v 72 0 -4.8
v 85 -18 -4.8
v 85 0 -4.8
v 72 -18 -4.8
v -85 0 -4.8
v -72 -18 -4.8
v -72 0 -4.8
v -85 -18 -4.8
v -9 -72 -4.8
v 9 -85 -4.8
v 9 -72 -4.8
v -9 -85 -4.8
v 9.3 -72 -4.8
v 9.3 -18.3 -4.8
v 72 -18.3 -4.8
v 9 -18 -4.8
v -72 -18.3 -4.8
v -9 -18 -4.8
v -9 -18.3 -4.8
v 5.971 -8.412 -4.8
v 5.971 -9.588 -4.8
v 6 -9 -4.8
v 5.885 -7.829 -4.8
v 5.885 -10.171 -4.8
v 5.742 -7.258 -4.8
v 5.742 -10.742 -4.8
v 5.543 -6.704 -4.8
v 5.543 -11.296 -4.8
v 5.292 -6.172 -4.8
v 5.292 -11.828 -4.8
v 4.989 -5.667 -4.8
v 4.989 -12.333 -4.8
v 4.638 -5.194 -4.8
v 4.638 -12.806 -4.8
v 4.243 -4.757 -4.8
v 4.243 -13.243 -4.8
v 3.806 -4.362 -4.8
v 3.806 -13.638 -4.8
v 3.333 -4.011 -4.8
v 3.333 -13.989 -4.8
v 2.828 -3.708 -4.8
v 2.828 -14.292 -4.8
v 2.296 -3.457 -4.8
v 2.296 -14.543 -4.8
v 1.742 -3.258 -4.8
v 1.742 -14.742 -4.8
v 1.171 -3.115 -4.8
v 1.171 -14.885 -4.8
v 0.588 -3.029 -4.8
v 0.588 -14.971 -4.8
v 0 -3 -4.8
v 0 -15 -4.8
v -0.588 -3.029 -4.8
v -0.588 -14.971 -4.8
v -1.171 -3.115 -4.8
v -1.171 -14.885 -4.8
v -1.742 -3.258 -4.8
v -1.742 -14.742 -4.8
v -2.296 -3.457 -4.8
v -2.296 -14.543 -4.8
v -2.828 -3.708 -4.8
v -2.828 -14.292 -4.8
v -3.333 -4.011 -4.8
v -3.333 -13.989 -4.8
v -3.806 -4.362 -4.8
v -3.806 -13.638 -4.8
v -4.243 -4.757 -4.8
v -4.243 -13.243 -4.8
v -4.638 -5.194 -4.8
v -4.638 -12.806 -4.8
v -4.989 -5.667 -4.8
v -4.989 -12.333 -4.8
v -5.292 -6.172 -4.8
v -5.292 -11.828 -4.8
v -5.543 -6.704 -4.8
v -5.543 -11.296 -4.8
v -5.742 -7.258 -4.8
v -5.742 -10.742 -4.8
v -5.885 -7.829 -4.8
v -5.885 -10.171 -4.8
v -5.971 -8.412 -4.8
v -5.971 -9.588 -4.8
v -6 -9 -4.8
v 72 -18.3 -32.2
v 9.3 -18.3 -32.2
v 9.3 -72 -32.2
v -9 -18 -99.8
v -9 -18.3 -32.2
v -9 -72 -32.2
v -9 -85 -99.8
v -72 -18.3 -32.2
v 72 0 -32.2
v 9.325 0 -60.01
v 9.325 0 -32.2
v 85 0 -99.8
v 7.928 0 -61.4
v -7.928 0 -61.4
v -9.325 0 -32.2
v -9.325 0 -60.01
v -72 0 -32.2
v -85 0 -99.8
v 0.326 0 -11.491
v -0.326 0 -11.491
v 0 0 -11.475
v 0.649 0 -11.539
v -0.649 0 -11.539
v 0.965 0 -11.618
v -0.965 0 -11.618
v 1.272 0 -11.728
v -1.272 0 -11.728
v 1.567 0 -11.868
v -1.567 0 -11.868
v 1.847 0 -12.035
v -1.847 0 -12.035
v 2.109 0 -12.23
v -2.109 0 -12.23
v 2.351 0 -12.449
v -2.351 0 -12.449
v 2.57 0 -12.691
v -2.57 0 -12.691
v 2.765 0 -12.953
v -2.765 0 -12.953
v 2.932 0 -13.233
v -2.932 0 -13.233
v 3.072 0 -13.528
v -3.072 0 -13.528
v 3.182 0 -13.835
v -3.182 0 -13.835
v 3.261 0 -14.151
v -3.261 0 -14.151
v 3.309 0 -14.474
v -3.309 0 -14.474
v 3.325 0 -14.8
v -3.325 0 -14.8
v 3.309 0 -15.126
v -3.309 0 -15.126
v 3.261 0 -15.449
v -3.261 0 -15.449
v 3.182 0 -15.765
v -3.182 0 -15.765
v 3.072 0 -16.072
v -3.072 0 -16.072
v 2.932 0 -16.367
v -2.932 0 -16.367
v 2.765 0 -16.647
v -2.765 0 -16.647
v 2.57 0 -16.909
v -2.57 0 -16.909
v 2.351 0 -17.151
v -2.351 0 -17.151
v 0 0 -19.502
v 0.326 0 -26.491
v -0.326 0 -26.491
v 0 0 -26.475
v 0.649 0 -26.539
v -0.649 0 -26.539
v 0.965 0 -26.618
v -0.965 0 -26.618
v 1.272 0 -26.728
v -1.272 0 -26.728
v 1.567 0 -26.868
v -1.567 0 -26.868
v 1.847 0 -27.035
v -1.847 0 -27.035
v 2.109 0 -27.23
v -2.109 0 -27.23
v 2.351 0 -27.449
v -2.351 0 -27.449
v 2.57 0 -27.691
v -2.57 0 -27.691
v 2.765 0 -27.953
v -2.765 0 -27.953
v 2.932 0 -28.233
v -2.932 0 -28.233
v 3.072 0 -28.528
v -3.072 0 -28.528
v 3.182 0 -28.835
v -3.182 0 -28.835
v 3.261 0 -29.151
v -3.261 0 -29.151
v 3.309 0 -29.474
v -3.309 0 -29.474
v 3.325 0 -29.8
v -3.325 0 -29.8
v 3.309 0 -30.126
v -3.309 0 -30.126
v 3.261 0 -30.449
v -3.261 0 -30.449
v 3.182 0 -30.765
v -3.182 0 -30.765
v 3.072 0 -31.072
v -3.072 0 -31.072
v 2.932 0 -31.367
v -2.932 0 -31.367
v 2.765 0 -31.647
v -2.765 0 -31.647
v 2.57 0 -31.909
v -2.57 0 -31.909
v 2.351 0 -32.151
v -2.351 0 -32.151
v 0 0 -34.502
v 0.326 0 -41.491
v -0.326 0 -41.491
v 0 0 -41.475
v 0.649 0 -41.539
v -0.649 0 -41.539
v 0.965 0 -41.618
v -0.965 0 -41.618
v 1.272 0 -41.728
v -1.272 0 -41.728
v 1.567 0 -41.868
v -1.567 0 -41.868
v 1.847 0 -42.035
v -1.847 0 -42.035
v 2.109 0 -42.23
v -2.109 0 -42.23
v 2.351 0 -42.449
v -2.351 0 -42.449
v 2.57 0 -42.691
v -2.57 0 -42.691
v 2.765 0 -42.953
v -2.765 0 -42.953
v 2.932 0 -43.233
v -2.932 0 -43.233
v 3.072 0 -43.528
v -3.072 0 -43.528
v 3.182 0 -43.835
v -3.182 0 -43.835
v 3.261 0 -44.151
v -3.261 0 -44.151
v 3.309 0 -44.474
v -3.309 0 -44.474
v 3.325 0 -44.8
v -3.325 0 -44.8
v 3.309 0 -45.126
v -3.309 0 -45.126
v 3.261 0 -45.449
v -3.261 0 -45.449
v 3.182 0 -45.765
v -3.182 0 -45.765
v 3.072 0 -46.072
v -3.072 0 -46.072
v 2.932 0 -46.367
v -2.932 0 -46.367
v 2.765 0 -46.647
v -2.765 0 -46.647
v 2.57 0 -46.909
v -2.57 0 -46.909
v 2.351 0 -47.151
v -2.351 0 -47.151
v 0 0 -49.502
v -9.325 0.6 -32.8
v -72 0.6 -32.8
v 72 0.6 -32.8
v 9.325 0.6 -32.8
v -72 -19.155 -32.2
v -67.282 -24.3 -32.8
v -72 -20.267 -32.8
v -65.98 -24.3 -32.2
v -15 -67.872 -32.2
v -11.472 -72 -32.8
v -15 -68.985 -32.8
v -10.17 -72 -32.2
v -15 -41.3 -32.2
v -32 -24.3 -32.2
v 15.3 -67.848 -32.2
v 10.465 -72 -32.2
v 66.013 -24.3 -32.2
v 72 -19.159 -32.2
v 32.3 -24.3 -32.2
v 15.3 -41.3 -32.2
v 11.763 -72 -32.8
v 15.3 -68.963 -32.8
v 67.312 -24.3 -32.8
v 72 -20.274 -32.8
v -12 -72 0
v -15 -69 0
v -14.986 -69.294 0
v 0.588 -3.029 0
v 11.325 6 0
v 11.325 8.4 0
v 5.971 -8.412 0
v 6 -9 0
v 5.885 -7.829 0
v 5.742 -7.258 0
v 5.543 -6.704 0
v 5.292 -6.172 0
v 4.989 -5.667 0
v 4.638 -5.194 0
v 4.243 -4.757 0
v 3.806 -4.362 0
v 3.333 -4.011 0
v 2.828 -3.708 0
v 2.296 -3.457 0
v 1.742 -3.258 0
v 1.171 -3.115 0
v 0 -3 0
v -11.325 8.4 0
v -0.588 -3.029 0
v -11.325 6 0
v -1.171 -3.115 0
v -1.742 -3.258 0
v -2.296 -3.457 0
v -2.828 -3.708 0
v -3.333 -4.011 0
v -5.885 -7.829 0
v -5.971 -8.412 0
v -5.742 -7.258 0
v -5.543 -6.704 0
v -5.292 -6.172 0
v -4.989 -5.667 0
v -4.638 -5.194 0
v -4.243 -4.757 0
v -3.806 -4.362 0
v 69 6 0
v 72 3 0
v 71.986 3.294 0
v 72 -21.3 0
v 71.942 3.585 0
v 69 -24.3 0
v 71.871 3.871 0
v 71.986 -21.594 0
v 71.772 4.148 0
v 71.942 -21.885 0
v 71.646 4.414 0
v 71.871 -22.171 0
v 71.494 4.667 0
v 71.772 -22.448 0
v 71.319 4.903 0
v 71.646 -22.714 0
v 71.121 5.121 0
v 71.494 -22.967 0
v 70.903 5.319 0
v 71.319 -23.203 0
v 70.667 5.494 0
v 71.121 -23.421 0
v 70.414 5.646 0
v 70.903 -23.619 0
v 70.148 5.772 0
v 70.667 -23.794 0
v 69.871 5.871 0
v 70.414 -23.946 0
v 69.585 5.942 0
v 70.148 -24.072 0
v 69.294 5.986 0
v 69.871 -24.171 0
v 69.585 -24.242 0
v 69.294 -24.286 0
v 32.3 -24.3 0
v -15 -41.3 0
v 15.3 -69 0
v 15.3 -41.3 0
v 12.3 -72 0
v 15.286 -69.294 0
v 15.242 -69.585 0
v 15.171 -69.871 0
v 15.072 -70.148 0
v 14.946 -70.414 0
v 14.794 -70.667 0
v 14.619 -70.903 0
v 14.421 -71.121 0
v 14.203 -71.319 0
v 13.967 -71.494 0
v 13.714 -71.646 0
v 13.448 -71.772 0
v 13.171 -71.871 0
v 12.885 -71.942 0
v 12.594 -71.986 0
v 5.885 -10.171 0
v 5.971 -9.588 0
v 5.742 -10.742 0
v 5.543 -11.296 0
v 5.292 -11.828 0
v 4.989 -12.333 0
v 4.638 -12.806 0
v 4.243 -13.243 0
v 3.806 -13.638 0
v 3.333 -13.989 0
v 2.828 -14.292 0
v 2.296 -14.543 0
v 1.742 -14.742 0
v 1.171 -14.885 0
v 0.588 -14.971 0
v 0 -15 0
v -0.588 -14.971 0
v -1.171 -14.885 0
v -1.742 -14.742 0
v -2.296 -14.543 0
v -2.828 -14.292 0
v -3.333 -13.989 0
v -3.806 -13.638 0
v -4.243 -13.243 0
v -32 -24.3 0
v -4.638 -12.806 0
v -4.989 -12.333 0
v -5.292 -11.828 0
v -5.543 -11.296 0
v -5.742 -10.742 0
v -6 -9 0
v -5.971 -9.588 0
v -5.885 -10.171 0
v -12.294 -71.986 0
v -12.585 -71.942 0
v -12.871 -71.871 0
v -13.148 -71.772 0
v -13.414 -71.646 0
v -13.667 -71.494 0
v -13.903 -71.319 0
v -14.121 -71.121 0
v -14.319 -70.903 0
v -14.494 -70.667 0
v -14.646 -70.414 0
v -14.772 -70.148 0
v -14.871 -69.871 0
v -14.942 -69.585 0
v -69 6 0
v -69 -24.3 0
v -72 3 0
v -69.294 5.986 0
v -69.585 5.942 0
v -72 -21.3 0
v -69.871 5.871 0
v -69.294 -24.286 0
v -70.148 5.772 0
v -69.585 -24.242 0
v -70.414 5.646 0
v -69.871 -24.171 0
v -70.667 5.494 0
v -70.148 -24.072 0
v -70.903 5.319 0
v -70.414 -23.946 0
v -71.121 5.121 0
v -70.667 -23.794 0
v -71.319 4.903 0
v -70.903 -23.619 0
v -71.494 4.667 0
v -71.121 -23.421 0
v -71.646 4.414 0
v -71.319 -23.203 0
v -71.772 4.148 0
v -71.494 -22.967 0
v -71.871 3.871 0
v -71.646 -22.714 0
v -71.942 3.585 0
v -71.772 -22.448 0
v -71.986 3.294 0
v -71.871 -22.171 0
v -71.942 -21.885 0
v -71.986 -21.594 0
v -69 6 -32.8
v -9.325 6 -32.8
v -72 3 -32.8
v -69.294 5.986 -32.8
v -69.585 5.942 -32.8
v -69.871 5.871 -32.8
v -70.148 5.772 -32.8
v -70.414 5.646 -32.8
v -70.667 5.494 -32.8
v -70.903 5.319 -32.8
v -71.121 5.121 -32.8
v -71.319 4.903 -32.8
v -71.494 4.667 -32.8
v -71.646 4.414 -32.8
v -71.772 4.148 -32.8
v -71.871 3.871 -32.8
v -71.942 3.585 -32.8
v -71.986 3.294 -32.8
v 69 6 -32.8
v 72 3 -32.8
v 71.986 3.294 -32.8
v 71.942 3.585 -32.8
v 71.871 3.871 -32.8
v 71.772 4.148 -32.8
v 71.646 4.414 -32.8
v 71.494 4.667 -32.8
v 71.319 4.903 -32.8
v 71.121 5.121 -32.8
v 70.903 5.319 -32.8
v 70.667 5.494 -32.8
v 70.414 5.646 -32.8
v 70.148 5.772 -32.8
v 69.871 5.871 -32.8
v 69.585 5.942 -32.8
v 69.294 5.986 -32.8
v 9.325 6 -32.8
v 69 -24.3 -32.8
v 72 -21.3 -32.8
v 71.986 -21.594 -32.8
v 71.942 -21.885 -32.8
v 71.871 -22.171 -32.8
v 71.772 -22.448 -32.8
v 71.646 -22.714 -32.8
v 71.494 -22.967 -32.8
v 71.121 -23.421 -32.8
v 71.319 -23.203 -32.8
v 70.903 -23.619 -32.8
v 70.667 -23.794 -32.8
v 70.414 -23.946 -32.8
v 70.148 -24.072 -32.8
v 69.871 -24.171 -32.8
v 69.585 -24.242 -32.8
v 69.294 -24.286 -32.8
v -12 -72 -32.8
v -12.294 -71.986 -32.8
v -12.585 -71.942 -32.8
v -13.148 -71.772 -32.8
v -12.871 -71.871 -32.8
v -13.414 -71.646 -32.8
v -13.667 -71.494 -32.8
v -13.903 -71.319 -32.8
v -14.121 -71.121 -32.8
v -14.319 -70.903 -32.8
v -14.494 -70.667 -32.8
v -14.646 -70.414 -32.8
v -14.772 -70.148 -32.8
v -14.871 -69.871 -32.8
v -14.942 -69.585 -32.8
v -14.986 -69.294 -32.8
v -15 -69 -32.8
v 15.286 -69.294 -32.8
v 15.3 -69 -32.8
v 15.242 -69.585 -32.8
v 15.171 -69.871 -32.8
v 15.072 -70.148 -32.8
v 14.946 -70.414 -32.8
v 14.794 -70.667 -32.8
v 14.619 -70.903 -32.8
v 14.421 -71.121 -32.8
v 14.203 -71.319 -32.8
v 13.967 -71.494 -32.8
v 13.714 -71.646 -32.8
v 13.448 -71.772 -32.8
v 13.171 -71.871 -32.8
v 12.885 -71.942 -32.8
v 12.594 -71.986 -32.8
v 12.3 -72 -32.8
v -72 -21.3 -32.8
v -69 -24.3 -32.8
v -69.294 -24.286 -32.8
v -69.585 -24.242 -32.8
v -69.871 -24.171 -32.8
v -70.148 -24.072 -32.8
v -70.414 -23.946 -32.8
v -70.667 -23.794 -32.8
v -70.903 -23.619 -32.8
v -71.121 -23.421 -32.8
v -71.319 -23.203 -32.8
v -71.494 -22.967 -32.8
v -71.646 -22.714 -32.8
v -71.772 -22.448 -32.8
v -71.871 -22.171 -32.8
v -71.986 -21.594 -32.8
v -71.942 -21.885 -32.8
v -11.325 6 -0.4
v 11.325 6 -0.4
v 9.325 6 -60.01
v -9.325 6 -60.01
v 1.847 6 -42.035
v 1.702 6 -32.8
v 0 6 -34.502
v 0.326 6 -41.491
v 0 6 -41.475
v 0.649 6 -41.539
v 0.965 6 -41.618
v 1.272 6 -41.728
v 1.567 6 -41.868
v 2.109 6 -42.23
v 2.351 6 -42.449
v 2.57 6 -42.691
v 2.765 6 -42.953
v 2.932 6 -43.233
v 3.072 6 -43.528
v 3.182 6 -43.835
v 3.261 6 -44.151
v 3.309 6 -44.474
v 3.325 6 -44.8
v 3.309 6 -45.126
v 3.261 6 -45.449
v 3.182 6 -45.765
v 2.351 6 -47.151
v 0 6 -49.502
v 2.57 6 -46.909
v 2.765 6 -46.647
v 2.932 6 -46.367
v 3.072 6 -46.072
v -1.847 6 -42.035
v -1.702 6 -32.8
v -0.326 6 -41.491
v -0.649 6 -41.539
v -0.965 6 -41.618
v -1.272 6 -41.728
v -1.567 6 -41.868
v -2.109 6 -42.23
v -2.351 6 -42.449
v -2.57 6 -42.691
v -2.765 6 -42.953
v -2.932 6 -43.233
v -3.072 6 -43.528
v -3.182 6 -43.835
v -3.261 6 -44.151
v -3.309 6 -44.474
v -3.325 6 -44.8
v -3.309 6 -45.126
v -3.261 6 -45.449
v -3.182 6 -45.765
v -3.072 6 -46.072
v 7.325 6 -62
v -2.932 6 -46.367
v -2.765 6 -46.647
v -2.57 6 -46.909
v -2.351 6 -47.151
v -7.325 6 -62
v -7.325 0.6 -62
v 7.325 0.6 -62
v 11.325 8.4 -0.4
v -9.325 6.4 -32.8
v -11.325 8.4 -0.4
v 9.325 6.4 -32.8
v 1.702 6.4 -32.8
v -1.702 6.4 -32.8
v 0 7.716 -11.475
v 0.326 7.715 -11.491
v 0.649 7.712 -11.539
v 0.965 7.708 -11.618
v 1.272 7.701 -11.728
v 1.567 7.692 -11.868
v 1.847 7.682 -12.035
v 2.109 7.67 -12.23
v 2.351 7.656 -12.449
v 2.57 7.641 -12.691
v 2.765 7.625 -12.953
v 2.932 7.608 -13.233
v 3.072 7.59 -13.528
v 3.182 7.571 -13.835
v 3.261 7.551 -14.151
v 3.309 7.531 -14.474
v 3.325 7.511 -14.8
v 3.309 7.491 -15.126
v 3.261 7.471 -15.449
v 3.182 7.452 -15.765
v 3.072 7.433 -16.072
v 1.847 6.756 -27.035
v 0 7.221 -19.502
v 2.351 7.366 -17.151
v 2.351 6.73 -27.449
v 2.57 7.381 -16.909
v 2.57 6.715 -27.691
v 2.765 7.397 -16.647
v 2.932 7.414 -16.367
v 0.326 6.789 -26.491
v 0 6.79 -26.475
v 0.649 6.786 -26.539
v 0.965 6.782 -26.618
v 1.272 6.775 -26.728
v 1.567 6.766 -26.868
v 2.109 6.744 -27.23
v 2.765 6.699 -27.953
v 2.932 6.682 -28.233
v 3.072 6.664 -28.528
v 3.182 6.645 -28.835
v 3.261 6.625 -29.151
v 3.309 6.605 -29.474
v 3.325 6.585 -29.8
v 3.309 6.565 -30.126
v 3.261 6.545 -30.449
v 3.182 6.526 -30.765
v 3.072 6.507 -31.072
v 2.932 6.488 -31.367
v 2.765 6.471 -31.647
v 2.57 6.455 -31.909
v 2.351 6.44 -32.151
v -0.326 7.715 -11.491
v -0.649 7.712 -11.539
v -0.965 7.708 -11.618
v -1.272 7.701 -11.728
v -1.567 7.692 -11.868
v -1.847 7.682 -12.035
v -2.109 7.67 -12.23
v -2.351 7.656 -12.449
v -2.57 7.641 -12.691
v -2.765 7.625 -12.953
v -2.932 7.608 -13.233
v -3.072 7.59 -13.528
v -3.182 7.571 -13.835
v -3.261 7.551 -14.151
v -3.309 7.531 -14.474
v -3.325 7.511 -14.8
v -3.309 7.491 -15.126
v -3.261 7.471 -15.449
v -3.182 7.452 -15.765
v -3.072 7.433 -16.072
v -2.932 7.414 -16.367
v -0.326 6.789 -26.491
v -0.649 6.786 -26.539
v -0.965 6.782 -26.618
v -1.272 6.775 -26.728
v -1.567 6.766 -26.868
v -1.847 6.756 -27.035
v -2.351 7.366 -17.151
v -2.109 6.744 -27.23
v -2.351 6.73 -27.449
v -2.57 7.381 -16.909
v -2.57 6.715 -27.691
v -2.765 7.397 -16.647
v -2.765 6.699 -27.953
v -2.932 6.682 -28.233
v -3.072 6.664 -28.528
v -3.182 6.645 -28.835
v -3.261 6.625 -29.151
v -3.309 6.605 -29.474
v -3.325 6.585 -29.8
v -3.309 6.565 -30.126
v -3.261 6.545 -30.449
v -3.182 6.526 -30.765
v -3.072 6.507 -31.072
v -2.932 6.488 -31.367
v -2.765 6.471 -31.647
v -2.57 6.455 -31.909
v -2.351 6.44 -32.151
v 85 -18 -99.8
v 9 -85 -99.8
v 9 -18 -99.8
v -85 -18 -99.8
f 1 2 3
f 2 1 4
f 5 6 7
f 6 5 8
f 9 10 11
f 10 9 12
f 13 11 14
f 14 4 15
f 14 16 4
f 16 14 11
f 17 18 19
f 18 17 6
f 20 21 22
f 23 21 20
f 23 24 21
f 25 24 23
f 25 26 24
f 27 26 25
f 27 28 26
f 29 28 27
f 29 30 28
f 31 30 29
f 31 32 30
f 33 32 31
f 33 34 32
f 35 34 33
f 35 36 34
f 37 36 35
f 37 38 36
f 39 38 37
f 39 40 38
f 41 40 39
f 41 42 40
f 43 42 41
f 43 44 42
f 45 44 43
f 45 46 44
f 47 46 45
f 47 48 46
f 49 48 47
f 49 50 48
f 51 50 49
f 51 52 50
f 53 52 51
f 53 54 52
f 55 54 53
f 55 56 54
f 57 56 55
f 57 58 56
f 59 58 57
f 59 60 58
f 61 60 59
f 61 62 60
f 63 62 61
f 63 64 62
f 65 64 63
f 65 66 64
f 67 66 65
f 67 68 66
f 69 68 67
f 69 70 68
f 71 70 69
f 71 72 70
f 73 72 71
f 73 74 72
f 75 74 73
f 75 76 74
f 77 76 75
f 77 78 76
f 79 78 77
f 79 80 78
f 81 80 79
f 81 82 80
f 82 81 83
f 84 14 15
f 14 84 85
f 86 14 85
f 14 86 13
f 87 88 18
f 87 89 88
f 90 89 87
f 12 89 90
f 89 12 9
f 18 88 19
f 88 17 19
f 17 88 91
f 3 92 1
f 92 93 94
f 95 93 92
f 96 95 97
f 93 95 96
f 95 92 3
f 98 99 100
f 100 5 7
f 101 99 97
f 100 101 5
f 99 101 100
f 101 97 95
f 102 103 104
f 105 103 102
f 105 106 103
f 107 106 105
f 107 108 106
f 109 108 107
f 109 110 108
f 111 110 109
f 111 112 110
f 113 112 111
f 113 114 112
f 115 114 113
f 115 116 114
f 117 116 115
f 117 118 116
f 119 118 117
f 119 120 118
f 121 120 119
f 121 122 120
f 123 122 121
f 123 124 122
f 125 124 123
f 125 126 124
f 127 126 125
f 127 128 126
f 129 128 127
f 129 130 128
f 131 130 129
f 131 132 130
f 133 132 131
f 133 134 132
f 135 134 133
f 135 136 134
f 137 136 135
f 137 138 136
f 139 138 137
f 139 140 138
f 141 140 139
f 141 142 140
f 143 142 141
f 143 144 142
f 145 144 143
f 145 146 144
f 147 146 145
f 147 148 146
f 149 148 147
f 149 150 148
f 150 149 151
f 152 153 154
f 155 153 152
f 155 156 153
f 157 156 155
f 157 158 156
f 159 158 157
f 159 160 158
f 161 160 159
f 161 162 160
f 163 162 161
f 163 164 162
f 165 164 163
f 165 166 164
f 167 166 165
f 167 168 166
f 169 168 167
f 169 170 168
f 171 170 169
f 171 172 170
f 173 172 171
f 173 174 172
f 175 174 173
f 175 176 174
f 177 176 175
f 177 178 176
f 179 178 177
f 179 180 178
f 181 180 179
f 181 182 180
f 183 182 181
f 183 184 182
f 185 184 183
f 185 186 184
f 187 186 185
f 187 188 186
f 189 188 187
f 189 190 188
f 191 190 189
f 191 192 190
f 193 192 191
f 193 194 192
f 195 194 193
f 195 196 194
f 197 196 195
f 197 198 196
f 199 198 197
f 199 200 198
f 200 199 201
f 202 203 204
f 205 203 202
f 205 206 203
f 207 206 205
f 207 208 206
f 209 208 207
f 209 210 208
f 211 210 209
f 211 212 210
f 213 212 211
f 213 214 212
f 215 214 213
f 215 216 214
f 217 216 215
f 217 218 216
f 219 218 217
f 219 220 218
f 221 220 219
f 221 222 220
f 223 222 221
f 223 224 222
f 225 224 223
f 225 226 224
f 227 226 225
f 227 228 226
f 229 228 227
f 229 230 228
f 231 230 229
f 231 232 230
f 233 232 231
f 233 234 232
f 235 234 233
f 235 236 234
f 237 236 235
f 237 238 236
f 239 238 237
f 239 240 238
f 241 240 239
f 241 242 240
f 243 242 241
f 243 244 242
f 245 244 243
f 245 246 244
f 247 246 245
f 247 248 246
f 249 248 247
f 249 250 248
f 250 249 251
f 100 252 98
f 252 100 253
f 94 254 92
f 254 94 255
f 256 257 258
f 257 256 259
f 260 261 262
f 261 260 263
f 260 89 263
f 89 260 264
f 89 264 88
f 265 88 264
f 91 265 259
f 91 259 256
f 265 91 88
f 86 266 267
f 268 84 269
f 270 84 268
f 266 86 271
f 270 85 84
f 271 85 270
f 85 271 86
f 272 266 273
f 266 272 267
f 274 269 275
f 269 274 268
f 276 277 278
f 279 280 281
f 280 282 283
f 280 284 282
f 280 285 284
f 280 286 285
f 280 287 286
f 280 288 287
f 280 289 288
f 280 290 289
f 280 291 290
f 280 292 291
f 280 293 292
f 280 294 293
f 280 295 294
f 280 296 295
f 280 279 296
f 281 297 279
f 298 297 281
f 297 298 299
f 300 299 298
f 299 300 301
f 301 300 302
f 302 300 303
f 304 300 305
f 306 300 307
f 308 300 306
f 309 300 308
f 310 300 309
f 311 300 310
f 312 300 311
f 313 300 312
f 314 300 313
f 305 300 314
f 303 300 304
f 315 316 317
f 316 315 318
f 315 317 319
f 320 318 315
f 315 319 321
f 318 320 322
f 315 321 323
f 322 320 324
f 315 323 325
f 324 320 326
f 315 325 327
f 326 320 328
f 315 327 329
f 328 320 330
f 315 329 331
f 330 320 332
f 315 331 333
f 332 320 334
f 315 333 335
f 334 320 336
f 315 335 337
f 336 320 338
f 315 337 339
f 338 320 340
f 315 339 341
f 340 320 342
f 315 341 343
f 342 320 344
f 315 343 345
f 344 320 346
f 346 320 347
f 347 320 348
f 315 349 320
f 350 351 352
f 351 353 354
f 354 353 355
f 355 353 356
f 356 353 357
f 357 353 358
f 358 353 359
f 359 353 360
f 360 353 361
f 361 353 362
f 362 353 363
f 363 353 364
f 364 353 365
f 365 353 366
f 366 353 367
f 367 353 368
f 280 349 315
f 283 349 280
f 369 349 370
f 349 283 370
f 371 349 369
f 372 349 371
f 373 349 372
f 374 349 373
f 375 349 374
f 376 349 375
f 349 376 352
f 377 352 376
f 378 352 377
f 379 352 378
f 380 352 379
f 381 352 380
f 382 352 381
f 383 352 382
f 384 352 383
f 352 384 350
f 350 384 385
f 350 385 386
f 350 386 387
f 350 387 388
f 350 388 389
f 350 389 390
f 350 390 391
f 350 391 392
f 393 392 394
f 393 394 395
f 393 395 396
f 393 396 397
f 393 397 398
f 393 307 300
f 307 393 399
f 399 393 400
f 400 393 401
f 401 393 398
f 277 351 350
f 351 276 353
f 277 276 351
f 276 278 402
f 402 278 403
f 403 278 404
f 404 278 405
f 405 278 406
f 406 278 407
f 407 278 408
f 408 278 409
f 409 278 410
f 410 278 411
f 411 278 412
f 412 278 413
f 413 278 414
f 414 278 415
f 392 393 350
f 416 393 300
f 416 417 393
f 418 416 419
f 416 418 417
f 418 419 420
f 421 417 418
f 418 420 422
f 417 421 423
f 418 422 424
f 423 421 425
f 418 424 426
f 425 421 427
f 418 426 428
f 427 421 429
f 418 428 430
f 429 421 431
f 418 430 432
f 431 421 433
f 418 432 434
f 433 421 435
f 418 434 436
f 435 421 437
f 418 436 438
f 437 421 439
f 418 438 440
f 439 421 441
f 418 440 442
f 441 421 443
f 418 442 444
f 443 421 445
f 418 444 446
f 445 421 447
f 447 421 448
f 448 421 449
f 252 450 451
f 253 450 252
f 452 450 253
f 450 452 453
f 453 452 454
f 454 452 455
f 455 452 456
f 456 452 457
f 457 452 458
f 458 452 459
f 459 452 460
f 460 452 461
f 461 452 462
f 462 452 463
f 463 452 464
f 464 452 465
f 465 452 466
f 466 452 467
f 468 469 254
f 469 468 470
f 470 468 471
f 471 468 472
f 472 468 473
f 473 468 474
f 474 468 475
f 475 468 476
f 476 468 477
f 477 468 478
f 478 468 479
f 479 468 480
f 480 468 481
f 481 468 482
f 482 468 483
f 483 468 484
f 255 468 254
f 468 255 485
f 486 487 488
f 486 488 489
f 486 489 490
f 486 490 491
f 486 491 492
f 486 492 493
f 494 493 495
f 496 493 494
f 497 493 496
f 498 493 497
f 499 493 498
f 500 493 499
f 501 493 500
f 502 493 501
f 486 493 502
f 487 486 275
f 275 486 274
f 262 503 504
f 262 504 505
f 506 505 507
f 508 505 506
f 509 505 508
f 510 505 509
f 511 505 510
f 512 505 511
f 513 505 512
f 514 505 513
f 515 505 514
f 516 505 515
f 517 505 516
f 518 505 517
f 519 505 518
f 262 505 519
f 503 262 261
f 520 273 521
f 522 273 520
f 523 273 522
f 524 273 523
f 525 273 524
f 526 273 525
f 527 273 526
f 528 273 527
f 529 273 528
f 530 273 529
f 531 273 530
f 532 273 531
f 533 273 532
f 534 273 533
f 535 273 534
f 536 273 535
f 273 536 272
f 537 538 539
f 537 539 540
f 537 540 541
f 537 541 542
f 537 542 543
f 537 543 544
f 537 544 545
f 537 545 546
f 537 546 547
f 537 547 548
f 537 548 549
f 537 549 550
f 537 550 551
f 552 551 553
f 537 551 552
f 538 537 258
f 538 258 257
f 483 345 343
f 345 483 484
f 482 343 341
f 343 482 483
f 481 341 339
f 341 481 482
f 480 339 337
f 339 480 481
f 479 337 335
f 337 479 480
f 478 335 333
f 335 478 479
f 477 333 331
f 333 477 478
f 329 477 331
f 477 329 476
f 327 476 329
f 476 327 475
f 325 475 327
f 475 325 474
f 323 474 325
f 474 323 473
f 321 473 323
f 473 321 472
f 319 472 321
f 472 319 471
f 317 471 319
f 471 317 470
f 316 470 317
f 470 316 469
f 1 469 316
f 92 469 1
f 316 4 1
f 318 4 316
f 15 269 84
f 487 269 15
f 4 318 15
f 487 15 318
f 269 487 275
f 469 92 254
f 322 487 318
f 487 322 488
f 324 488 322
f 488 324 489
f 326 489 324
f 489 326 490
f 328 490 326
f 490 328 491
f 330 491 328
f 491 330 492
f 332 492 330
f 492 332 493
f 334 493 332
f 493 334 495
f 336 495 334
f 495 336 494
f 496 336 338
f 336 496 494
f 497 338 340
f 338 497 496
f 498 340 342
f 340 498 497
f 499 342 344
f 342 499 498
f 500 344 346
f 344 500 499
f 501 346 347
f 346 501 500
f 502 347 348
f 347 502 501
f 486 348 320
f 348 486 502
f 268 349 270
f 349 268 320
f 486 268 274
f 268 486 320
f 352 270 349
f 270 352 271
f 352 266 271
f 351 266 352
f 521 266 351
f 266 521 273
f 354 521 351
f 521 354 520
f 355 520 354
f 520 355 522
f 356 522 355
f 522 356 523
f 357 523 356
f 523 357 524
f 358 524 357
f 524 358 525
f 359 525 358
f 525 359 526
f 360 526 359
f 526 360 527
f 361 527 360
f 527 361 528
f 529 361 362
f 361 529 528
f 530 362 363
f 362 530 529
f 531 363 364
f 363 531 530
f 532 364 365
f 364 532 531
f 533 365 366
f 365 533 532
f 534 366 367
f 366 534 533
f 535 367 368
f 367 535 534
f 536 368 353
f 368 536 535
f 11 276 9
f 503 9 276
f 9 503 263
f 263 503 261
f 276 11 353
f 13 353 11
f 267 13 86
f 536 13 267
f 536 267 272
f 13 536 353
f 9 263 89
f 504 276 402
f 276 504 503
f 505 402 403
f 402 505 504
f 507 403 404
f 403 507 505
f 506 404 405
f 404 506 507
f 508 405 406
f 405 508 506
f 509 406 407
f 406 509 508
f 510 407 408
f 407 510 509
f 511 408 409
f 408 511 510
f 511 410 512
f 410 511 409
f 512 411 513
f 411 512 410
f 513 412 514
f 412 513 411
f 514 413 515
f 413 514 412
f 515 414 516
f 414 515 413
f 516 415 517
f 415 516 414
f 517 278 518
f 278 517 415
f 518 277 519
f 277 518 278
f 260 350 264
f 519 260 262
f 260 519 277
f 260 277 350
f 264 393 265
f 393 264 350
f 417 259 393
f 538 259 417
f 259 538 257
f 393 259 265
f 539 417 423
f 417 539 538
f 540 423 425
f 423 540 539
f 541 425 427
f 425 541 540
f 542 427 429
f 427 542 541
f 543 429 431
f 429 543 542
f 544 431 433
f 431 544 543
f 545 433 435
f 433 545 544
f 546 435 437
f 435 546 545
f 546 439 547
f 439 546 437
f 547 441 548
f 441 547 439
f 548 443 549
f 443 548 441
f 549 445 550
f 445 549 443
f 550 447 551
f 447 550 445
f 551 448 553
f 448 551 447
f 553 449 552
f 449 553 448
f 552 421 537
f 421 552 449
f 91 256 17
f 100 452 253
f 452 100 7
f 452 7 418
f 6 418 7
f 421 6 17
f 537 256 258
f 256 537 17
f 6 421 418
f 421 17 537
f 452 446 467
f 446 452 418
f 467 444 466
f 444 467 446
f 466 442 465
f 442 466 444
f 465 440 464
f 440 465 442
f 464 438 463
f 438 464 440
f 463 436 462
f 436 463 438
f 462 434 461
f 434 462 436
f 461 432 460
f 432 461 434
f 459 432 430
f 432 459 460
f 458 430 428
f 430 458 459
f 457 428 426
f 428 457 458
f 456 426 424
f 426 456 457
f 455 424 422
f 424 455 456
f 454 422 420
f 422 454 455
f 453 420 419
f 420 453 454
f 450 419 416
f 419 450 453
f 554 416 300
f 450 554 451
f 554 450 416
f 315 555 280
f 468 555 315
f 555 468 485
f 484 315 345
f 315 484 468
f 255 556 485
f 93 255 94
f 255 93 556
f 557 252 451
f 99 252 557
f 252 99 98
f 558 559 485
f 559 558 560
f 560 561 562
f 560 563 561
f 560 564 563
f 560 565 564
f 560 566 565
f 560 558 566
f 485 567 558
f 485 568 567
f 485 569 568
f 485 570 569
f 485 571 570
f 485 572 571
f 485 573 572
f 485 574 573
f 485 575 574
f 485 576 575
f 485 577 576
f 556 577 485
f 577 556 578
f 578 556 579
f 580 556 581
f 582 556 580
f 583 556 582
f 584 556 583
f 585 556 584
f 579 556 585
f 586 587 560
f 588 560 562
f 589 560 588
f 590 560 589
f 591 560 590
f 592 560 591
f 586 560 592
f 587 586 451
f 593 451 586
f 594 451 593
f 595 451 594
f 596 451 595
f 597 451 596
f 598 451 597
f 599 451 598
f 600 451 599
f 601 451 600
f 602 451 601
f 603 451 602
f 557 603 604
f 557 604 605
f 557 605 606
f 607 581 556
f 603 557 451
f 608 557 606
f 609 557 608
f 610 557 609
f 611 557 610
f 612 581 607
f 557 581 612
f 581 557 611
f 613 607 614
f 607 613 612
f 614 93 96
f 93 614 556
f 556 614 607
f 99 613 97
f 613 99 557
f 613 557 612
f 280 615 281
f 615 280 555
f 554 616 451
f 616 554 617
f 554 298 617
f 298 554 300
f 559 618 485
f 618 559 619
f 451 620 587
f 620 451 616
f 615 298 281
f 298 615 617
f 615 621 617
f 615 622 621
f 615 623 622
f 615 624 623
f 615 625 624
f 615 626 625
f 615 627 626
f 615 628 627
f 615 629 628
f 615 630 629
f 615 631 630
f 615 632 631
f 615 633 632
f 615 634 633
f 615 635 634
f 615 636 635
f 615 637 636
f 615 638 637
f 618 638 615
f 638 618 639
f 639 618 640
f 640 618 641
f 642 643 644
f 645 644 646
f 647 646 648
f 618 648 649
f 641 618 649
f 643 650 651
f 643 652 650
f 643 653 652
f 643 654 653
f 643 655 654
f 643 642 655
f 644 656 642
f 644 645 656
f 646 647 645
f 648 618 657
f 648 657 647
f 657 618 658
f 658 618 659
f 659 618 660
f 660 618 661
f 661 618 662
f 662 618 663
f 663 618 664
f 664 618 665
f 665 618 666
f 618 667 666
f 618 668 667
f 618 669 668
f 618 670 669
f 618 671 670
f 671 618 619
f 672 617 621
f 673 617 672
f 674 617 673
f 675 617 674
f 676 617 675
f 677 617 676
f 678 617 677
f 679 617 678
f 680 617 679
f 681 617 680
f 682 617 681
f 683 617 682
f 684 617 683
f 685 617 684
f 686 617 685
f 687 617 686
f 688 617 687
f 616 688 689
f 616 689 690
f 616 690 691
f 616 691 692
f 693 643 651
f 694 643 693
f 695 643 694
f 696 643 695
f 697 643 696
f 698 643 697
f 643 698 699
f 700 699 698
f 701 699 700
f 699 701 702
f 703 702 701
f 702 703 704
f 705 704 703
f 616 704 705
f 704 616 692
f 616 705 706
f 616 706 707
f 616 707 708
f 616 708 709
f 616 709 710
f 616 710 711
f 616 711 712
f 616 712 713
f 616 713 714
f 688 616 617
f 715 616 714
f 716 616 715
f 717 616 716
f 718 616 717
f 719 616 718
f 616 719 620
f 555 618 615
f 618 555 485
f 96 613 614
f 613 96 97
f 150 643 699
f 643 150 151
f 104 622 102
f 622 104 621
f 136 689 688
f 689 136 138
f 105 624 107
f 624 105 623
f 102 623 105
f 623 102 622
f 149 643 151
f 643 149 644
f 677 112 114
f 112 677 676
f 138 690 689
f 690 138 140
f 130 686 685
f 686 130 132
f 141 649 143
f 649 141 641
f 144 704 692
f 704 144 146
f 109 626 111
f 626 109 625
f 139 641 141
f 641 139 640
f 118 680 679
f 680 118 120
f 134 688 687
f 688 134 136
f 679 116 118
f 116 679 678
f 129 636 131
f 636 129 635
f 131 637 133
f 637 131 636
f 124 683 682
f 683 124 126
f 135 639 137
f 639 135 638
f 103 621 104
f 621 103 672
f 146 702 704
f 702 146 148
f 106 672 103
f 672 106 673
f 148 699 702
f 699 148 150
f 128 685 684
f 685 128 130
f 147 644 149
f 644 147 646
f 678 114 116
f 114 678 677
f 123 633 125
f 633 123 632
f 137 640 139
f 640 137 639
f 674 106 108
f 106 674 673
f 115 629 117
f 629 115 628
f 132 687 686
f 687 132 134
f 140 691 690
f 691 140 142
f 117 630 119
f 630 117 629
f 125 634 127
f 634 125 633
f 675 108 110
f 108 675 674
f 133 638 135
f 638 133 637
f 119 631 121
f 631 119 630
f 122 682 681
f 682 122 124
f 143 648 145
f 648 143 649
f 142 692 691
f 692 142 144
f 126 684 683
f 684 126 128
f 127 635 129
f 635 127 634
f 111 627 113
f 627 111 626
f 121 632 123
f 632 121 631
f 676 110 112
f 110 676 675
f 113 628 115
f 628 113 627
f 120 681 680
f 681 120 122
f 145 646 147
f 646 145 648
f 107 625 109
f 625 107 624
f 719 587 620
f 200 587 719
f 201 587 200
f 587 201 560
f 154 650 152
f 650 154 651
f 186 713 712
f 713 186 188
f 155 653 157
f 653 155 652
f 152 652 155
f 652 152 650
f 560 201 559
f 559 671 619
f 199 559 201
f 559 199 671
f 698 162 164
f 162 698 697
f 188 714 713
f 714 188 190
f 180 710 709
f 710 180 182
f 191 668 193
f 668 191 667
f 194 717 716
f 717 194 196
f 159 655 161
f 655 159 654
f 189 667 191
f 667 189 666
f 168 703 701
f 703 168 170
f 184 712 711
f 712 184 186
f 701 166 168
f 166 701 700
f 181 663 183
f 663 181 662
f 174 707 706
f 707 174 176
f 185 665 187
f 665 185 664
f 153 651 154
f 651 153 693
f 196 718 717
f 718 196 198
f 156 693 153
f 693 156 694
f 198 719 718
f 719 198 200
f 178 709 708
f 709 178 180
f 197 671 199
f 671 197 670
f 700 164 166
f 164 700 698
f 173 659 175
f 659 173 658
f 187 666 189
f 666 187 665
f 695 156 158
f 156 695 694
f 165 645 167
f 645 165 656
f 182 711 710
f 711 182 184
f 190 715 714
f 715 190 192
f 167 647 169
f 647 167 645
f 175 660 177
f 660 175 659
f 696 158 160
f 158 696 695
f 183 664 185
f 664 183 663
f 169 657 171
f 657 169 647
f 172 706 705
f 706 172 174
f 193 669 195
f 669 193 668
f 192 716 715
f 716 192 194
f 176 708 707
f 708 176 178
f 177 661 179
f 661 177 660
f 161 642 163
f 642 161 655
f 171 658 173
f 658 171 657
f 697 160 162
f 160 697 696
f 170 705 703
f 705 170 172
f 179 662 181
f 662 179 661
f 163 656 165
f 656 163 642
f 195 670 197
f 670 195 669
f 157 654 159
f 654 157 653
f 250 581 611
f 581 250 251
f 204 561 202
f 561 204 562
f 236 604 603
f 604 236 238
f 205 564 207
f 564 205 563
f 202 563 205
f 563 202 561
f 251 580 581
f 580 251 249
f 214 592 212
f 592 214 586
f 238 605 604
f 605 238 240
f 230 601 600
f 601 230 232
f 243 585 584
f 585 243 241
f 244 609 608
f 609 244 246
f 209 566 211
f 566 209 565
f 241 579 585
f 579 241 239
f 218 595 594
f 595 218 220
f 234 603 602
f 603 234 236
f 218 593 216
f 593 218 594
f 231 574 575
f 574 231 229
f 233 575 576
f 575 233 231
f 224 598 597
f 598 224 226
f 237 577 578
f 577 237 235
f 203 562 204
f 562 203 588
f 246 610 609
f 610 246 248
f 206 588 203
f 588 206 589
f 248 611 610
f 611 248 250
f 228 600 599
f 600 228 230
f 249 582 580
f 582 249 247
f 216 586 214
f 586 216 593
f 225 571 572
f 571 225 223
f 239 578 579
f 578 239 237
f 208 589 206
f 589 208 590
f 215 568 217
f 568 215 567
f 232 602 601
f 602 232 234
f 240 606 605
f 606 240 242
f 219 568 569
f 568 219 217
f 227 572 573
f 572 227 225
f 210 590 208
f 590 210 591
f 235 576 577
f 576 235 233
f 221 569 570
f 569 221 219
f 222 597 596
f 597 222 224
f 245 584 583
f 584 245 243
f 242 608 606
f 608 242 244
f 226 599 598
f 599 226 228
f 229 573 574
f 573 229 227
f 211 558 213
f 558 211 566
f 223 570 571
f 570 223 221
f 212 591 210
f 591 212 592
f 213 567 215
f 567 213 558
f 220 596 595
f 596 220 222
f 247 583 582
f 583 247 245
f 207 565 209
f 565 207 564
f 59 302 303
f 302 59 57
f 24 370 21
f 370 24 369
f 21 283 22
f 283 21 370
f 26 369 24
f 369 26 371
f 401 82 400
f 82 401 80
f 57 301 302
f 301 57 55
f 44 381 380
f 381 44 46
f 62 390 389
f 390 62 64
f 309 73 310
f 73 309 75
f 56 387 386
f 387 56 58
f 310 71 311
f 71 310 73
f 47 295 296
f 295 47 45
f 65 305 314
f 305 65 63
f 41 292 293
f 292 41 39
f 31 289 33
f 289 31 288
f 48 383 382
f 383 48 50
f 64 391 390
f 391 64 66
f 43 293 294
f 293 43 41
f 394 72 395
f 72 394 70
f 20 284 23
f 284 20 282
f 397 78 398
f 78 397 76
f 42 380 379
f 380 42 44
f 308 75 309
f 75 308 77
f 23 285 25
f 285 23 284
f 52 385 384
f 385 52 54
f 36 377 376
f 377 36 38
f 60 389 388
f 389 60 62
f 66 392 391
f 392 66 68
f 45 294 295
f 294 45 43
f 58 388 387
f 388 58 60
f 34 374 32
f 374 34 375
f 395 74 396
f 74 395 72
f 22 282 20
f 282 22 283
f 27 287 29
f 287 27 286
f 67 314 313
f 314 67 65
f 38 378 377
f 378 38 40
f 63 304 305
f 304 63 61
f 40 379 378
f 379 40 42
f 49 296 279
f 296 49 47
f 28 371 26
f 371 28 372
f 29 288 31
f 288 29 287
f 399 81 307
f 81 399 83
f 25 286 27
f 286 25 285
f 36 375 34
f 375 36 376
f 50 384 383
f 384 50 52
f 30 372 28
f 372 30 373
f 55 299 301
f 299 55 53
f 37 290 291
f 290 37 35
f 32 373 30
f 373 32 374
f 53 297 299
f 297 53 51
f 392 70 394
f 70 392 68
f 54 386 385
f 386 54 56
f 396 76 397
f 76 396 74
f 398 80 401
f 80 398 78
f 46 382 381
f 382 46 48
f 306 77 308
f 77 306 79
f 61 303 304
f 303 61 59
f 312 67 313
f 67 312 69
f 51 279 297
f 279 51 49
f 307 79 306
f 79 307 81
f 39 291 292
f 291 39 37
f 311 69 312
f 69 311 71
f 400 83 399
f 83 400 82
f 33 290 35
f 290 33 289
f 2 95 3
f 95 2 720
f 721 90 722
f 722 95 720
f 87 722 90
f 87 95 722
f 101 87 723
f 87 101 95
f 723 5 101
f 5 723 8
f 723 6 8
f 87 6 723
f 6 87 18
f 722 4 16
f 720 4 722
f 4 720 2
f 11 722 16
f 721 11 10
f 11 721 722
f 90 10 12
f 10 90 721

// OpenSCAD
// file: common.scad
// Wspolna geometria. Uklad druku: mostek na Z=0, szczeliny otwarte ku +Z.
// W uzyciu nasadke odwraca sie: mostek lezy na gornych krawedziach plyt.
function choose(v,a,b,c) = v=="standard" ? a : v=="reinforced" ? b : c;
function al() = arm_length>0 ? arm_length : choose(variant,70,72,52);
function wt() = wall_thickness>0 ? wall_thickness : choose(variant,5,6,4.4);
function bh() = body_height>0 ? body_height : choose(variant,24,28,20);
function bt() = base_thickness>0 ? base_thickness : choose(variant,3.6,4.8,3.2);
function gh() = guide_height>0 ? guide_height : choose(variant,58,62,52);
function gs() = reinforcement_size>0 ? reinforcement_size : choose(variant,11,17,7);
function rd() = variant=="reinforced" ? 2.4 : 0;
function margin() = wt()+rd();
function slot() = board_thickness+clearance;
function tw() = max(board_thickness,guide_hole_diameter+2*wt());
function top_hole() = bt()+guide_first_offset+(guide_hole_count-1)*guide_hole_spacing;
function footprint_depth() = al()+margin();

module check_parameters() {
    assert(variant=="standard" || variant=="reinforced" || variant=="compact", "Nieznany wariant");
    assert(board_thickness>=12 && clearance>=0 && clearance<=1, "Sprawdz grubosc plyty i luz");
    assert(wt()>=3.6 && bt()>=2.8 && bh()>2*lead_in, "Zbyt cienkie scianki / mostek");
    assert(lead_in>=0 && lead_in<wt()/2 && corner_radius>0 && corner_radius<wt(), "Bledny promien / faza");
    assert(al()>slot()+wt()+gs()+4, "Za krotkie ramiona dla tych parametrow");
    assert(guide_hole_diameter>0 && guide_hole_spacing>guide_hole_diameter*1.21+3, "Za maly mostek miedzy otworami");
    assert(guide_hole_count>=1 && guide_hole_count==floor(guide_hole_count), "Liczba otworow musi byc calkowita");
    assert(gh()>top_hole()+guide_hole_diameter/sqrt(2)+4 && gh()>bt()+bh(), "Za niska wieza otworow");
    assert(inspection_diameter<slot()-4, "Za duze okno kontrolne");
    children();
}

module rect(x,y,w,h) { translate([x,y]) square([w,h]); }

// Erozja i dylatacja zaokraglaja wypukle krawedzie, zachowujac gabaryt.
module rounded_outer() { offset(r=corner_radius) offset(delta=-corner_radius) children(); }

module raw_outer(kind) {
    a=al(); w=wt(); s=slot(); t=board_thickness; g=gs();
    if(kind=="TL") {
        rect(-a,-w,2*a,s+2*w);
        rect(-t/2-w,s, s+2*w,a-s);
        for(side=[-1,1]) translate([side<0 ? -t/2-w : t/2+clearance+w,s+w])
            scale([side,1]) polygon([[0,0],[g,0],[0,g]]);
    } else {
        rect(-w,-w,a+w,s+2*w);
        rect(-w,-w,s+2*w,a+w);
        translate([s+w,s+w]) polygon([[0,0],[g,0],[0,g]]);
    }
}

module outer(kind) { rounded_outer() union() raw_outer(kind); }

// Wazne: szczeliny nie sa zaokraglane do srodka. Prostokatna plyta
// moze dojsc do mostka bez kolizji z promieniem lub zebrem.
module slots_2d(kind, extra=0) {
    a=al(); s=slot(); t=board_thickness; e=1;
    offset(delta=extra) union() {
        if(kind=="TL") {
            rect(-a-e,0,2*a+2*e,s);
            rect(-t/2,t,s,a-t+e);
        } else {
            rect(0,0,a+e,s);
            rect(0,0,s,a+e);
        }
    }
}

module slot_cut(kind, height, mouth=true) {
    translate([0,0,bt()]) linear_extrude(height=height-bt()+1) slots_2d(kind);
    if(mouth && lead_in>0) {
        // Hull dwoch przekrojow daje faze bez podpory, material ubywa ku gorze.
        hull() {
            translate([0,0,height-lead_in]) linear_extrude(.01) slots_2d(kind);
            translate([0,0,height]) linear_extrude(.01) slots_2d(kind,lead_in);
        }
    }
}

module inspection(kind) {
    if(include_inspection_windows) {
        if(kind=="TL") translate([0,board_thickness/2,-1])
            cylinder(h=bt()+2,d=inspection_diameter);
        else for(axis=[0,1]) rotate([0,0,90*axis])
            // Obracamy wzgledem dodatniego naroznika przez zamiane X/Y.
            if(axis==0) hull() for(x=[board_thickness/2,al()-12])
                translate([x,board_thickness/2,-1]) cylinder(h=bt()+2,d=board_thickness/3);
            else hull() for(x=[board_thickness/2,al()-12])
                translate([x,-board_thickness/2,-1]) cylinder(h=bt()+2,d=board_thickness/3);
    }
}

module tower_one(kind) {
    x=kind=="TL" ? -tw()/2 : 0;
    // Wieza opiera sie cala dlugoscia na mostku i zewnetrznej sciance.
    translate([x,-wt(),0]) cube([tw(),wt(),gh()-2]);
    hull() {
        translate([x,-wt(),gh()-2.01]) cube([tw(),wt(),.02]);
        translate([x+2,-wt(),gh()-.02]) cube([tw()-4,wt(),.02]);
    }
    if(rd()>0) hull() {
        translate([x-2,-margin(),0]) cube([tw()+4,rd()+.02,.4]);
        translate([x,-wt()-.4,bt()+bh()-.4]) cube([tw(),.42,.4]);
    }
}

module tower(kind) {
    tower_one(kind);
    if(kind=="LL") {
        rotate([0,0,90]) mirror([0,1,0]) tower_one(kind);
        // Ciagly narozny slup: dwie wysokie scianki musza laczyc sie
        // powierzchnia, nie tylko krawedzia (wymog bryly manifold).
        linear_extrude(height=gh()) intersection() {
            rect(-wt(),-wt(),wt(),wt());
            circle(r=wt());
        }
    }
}

module hole_profile() {
    r=guide_hole_diameter/2;
    union() {
        circle(r=r);
        if(support_free_holes) polygon([[-r/sqrt(2),r/sqrt(2)],[0,r*sqrt(2)],[r/sqrt(2),r/sqrt(2)]]);
    }
}

module holes_one(kind) {
    x=kind=="TL" ? 0 : board_thickness/2;
    if(include_guide_holes) for(i=[0:guide_hole_count-1])
        translate([x,1,bt()+guide_first_offset+i*guide_hole_spacing])
            rotate([90,0,0]) linear_extrude(height=margin()+2) hole_profile();
}

module holes(kind) {
    holes_one(kind);
    if(kind=="LL") rotate([0,0,90]) mirror([0,1,0]) holes_one(kind);
}

module handle(kind) {
    check_parameters() difference() {
        union() {
            difference() {
                linear_extrude(height=bt()+bh()) outer(kind);
                slot_cut(kind,bt()+bh());
            }
            difference() {
                tower(kind);
                slot_cut(kind,gh());
            }
        }
        holes(kind);
        inspection(kind);
    }
}

// Prawdziwe polaczenie doczolowe: plyty stykaja sie, nie przenikaja.
module board_A(kind, length=85, height=95, thickness=board_thickness) {
    t=thickness;
    translate([kind=="TL" ? -length : 0,0,bt()])
        cube([kind=="TL" ? 2*length : length,t,height]);
}
module board_B(kind, length=85, height=95, thickness=board_thickness) {
    t=thickness;
    translate([kind=="TL" ? -t/2 : 0,t,bt()]) cube([t,length-t,height]);
}
module boards(kind, length=85, height=95, thickness=board_thickness) {
    board_A(kind,length,height,thickness);
    board_B(kind,length,height,thickness);
}

module fit_coupon(c=fit_clearance) {
    w=5; b=3.2; h=20; s=board_thickness+c; length=24;
    difference() {
        union() {
            translate([0,-w,0]) cube([length,s+2*w,b+h]);
            translate([length-.1,-w,0]) cube([15.1,8,b]);
        }
        translate([-1,0,b]) cube([length+2,s,h+1]);
        if(lead_in>0) hull() {
            translate([-1,0,b+h-lead_in]) cube([length+2,s,.01]);
            translate([-1,-lead_in,b+h]) cube([length+2,s+2*lead_in,.01]);
        }
        translate([31.5,-1,b-.7]) linear_extrude(1)
            text(str(c),size=4,halign="center",valign="center",font="Liberation Sans:style=Bold");
    }
}
// file: config.scad
// Wszystkie wymiary w mm. 0 = wartosc dobrana dla wariantu.
variant = "reinforced"; // [standard,reinforced,compact]
board_thickness = 18;
clearance = 0.3;        // CALKOWITY luz; szczelina = t + clearance
arm_length = 0;        // LL: dlugosc kazdego ramienia; TL: polowa poprzeczki
wall_thickness = 0;
body_height = 0;       // wysokosc chwytu ponad mostkiem, bez wiezy otworow
base_thickness = 0;
guide_height = 0;      // calkowita wysokosc modelu od stolu
corner_radius = 3;     // zewnetrzne zaokraglenia XY
reinforcement_size = 0;
lead_in = 0.6;         // faza 45 stopni przy wlocie
guide_hole_diameter = 6.65;
guide_hole_spacing = 15;
guide_first_offset = 10; // od powierzchni mostka, os pierwszego otworu
guide_hole_count = 3;
include_guide_holes = true;
support_free_holes = true; // okrag wpisany + daszek 45 stopni
include_inspection_windows = true;
inspection_diameter = 12;
plate_number = 1;       // 1 i 2: po 1 TL + 2 LL = caly zestaw
fit_clearance = 0.3;
$fn = 64;
// main file
include <config.scad>
include <common.scad>
demo_type="TL"; // [TL,LL]
removal_distance=0; // 0 = osadzony; 70 = zdjety pionowo z krawedzi
// Mostek u gory, plyty w dol. Kolory sluza tylko podgladowi, nie STL.
rotate([180,0,0]) {
    color([.95,.40,.08]) translate([0,0,-removal_distance]) handle(demo_type);
    color([.75,.82,.87,.55]) boards(demo_type);
}
